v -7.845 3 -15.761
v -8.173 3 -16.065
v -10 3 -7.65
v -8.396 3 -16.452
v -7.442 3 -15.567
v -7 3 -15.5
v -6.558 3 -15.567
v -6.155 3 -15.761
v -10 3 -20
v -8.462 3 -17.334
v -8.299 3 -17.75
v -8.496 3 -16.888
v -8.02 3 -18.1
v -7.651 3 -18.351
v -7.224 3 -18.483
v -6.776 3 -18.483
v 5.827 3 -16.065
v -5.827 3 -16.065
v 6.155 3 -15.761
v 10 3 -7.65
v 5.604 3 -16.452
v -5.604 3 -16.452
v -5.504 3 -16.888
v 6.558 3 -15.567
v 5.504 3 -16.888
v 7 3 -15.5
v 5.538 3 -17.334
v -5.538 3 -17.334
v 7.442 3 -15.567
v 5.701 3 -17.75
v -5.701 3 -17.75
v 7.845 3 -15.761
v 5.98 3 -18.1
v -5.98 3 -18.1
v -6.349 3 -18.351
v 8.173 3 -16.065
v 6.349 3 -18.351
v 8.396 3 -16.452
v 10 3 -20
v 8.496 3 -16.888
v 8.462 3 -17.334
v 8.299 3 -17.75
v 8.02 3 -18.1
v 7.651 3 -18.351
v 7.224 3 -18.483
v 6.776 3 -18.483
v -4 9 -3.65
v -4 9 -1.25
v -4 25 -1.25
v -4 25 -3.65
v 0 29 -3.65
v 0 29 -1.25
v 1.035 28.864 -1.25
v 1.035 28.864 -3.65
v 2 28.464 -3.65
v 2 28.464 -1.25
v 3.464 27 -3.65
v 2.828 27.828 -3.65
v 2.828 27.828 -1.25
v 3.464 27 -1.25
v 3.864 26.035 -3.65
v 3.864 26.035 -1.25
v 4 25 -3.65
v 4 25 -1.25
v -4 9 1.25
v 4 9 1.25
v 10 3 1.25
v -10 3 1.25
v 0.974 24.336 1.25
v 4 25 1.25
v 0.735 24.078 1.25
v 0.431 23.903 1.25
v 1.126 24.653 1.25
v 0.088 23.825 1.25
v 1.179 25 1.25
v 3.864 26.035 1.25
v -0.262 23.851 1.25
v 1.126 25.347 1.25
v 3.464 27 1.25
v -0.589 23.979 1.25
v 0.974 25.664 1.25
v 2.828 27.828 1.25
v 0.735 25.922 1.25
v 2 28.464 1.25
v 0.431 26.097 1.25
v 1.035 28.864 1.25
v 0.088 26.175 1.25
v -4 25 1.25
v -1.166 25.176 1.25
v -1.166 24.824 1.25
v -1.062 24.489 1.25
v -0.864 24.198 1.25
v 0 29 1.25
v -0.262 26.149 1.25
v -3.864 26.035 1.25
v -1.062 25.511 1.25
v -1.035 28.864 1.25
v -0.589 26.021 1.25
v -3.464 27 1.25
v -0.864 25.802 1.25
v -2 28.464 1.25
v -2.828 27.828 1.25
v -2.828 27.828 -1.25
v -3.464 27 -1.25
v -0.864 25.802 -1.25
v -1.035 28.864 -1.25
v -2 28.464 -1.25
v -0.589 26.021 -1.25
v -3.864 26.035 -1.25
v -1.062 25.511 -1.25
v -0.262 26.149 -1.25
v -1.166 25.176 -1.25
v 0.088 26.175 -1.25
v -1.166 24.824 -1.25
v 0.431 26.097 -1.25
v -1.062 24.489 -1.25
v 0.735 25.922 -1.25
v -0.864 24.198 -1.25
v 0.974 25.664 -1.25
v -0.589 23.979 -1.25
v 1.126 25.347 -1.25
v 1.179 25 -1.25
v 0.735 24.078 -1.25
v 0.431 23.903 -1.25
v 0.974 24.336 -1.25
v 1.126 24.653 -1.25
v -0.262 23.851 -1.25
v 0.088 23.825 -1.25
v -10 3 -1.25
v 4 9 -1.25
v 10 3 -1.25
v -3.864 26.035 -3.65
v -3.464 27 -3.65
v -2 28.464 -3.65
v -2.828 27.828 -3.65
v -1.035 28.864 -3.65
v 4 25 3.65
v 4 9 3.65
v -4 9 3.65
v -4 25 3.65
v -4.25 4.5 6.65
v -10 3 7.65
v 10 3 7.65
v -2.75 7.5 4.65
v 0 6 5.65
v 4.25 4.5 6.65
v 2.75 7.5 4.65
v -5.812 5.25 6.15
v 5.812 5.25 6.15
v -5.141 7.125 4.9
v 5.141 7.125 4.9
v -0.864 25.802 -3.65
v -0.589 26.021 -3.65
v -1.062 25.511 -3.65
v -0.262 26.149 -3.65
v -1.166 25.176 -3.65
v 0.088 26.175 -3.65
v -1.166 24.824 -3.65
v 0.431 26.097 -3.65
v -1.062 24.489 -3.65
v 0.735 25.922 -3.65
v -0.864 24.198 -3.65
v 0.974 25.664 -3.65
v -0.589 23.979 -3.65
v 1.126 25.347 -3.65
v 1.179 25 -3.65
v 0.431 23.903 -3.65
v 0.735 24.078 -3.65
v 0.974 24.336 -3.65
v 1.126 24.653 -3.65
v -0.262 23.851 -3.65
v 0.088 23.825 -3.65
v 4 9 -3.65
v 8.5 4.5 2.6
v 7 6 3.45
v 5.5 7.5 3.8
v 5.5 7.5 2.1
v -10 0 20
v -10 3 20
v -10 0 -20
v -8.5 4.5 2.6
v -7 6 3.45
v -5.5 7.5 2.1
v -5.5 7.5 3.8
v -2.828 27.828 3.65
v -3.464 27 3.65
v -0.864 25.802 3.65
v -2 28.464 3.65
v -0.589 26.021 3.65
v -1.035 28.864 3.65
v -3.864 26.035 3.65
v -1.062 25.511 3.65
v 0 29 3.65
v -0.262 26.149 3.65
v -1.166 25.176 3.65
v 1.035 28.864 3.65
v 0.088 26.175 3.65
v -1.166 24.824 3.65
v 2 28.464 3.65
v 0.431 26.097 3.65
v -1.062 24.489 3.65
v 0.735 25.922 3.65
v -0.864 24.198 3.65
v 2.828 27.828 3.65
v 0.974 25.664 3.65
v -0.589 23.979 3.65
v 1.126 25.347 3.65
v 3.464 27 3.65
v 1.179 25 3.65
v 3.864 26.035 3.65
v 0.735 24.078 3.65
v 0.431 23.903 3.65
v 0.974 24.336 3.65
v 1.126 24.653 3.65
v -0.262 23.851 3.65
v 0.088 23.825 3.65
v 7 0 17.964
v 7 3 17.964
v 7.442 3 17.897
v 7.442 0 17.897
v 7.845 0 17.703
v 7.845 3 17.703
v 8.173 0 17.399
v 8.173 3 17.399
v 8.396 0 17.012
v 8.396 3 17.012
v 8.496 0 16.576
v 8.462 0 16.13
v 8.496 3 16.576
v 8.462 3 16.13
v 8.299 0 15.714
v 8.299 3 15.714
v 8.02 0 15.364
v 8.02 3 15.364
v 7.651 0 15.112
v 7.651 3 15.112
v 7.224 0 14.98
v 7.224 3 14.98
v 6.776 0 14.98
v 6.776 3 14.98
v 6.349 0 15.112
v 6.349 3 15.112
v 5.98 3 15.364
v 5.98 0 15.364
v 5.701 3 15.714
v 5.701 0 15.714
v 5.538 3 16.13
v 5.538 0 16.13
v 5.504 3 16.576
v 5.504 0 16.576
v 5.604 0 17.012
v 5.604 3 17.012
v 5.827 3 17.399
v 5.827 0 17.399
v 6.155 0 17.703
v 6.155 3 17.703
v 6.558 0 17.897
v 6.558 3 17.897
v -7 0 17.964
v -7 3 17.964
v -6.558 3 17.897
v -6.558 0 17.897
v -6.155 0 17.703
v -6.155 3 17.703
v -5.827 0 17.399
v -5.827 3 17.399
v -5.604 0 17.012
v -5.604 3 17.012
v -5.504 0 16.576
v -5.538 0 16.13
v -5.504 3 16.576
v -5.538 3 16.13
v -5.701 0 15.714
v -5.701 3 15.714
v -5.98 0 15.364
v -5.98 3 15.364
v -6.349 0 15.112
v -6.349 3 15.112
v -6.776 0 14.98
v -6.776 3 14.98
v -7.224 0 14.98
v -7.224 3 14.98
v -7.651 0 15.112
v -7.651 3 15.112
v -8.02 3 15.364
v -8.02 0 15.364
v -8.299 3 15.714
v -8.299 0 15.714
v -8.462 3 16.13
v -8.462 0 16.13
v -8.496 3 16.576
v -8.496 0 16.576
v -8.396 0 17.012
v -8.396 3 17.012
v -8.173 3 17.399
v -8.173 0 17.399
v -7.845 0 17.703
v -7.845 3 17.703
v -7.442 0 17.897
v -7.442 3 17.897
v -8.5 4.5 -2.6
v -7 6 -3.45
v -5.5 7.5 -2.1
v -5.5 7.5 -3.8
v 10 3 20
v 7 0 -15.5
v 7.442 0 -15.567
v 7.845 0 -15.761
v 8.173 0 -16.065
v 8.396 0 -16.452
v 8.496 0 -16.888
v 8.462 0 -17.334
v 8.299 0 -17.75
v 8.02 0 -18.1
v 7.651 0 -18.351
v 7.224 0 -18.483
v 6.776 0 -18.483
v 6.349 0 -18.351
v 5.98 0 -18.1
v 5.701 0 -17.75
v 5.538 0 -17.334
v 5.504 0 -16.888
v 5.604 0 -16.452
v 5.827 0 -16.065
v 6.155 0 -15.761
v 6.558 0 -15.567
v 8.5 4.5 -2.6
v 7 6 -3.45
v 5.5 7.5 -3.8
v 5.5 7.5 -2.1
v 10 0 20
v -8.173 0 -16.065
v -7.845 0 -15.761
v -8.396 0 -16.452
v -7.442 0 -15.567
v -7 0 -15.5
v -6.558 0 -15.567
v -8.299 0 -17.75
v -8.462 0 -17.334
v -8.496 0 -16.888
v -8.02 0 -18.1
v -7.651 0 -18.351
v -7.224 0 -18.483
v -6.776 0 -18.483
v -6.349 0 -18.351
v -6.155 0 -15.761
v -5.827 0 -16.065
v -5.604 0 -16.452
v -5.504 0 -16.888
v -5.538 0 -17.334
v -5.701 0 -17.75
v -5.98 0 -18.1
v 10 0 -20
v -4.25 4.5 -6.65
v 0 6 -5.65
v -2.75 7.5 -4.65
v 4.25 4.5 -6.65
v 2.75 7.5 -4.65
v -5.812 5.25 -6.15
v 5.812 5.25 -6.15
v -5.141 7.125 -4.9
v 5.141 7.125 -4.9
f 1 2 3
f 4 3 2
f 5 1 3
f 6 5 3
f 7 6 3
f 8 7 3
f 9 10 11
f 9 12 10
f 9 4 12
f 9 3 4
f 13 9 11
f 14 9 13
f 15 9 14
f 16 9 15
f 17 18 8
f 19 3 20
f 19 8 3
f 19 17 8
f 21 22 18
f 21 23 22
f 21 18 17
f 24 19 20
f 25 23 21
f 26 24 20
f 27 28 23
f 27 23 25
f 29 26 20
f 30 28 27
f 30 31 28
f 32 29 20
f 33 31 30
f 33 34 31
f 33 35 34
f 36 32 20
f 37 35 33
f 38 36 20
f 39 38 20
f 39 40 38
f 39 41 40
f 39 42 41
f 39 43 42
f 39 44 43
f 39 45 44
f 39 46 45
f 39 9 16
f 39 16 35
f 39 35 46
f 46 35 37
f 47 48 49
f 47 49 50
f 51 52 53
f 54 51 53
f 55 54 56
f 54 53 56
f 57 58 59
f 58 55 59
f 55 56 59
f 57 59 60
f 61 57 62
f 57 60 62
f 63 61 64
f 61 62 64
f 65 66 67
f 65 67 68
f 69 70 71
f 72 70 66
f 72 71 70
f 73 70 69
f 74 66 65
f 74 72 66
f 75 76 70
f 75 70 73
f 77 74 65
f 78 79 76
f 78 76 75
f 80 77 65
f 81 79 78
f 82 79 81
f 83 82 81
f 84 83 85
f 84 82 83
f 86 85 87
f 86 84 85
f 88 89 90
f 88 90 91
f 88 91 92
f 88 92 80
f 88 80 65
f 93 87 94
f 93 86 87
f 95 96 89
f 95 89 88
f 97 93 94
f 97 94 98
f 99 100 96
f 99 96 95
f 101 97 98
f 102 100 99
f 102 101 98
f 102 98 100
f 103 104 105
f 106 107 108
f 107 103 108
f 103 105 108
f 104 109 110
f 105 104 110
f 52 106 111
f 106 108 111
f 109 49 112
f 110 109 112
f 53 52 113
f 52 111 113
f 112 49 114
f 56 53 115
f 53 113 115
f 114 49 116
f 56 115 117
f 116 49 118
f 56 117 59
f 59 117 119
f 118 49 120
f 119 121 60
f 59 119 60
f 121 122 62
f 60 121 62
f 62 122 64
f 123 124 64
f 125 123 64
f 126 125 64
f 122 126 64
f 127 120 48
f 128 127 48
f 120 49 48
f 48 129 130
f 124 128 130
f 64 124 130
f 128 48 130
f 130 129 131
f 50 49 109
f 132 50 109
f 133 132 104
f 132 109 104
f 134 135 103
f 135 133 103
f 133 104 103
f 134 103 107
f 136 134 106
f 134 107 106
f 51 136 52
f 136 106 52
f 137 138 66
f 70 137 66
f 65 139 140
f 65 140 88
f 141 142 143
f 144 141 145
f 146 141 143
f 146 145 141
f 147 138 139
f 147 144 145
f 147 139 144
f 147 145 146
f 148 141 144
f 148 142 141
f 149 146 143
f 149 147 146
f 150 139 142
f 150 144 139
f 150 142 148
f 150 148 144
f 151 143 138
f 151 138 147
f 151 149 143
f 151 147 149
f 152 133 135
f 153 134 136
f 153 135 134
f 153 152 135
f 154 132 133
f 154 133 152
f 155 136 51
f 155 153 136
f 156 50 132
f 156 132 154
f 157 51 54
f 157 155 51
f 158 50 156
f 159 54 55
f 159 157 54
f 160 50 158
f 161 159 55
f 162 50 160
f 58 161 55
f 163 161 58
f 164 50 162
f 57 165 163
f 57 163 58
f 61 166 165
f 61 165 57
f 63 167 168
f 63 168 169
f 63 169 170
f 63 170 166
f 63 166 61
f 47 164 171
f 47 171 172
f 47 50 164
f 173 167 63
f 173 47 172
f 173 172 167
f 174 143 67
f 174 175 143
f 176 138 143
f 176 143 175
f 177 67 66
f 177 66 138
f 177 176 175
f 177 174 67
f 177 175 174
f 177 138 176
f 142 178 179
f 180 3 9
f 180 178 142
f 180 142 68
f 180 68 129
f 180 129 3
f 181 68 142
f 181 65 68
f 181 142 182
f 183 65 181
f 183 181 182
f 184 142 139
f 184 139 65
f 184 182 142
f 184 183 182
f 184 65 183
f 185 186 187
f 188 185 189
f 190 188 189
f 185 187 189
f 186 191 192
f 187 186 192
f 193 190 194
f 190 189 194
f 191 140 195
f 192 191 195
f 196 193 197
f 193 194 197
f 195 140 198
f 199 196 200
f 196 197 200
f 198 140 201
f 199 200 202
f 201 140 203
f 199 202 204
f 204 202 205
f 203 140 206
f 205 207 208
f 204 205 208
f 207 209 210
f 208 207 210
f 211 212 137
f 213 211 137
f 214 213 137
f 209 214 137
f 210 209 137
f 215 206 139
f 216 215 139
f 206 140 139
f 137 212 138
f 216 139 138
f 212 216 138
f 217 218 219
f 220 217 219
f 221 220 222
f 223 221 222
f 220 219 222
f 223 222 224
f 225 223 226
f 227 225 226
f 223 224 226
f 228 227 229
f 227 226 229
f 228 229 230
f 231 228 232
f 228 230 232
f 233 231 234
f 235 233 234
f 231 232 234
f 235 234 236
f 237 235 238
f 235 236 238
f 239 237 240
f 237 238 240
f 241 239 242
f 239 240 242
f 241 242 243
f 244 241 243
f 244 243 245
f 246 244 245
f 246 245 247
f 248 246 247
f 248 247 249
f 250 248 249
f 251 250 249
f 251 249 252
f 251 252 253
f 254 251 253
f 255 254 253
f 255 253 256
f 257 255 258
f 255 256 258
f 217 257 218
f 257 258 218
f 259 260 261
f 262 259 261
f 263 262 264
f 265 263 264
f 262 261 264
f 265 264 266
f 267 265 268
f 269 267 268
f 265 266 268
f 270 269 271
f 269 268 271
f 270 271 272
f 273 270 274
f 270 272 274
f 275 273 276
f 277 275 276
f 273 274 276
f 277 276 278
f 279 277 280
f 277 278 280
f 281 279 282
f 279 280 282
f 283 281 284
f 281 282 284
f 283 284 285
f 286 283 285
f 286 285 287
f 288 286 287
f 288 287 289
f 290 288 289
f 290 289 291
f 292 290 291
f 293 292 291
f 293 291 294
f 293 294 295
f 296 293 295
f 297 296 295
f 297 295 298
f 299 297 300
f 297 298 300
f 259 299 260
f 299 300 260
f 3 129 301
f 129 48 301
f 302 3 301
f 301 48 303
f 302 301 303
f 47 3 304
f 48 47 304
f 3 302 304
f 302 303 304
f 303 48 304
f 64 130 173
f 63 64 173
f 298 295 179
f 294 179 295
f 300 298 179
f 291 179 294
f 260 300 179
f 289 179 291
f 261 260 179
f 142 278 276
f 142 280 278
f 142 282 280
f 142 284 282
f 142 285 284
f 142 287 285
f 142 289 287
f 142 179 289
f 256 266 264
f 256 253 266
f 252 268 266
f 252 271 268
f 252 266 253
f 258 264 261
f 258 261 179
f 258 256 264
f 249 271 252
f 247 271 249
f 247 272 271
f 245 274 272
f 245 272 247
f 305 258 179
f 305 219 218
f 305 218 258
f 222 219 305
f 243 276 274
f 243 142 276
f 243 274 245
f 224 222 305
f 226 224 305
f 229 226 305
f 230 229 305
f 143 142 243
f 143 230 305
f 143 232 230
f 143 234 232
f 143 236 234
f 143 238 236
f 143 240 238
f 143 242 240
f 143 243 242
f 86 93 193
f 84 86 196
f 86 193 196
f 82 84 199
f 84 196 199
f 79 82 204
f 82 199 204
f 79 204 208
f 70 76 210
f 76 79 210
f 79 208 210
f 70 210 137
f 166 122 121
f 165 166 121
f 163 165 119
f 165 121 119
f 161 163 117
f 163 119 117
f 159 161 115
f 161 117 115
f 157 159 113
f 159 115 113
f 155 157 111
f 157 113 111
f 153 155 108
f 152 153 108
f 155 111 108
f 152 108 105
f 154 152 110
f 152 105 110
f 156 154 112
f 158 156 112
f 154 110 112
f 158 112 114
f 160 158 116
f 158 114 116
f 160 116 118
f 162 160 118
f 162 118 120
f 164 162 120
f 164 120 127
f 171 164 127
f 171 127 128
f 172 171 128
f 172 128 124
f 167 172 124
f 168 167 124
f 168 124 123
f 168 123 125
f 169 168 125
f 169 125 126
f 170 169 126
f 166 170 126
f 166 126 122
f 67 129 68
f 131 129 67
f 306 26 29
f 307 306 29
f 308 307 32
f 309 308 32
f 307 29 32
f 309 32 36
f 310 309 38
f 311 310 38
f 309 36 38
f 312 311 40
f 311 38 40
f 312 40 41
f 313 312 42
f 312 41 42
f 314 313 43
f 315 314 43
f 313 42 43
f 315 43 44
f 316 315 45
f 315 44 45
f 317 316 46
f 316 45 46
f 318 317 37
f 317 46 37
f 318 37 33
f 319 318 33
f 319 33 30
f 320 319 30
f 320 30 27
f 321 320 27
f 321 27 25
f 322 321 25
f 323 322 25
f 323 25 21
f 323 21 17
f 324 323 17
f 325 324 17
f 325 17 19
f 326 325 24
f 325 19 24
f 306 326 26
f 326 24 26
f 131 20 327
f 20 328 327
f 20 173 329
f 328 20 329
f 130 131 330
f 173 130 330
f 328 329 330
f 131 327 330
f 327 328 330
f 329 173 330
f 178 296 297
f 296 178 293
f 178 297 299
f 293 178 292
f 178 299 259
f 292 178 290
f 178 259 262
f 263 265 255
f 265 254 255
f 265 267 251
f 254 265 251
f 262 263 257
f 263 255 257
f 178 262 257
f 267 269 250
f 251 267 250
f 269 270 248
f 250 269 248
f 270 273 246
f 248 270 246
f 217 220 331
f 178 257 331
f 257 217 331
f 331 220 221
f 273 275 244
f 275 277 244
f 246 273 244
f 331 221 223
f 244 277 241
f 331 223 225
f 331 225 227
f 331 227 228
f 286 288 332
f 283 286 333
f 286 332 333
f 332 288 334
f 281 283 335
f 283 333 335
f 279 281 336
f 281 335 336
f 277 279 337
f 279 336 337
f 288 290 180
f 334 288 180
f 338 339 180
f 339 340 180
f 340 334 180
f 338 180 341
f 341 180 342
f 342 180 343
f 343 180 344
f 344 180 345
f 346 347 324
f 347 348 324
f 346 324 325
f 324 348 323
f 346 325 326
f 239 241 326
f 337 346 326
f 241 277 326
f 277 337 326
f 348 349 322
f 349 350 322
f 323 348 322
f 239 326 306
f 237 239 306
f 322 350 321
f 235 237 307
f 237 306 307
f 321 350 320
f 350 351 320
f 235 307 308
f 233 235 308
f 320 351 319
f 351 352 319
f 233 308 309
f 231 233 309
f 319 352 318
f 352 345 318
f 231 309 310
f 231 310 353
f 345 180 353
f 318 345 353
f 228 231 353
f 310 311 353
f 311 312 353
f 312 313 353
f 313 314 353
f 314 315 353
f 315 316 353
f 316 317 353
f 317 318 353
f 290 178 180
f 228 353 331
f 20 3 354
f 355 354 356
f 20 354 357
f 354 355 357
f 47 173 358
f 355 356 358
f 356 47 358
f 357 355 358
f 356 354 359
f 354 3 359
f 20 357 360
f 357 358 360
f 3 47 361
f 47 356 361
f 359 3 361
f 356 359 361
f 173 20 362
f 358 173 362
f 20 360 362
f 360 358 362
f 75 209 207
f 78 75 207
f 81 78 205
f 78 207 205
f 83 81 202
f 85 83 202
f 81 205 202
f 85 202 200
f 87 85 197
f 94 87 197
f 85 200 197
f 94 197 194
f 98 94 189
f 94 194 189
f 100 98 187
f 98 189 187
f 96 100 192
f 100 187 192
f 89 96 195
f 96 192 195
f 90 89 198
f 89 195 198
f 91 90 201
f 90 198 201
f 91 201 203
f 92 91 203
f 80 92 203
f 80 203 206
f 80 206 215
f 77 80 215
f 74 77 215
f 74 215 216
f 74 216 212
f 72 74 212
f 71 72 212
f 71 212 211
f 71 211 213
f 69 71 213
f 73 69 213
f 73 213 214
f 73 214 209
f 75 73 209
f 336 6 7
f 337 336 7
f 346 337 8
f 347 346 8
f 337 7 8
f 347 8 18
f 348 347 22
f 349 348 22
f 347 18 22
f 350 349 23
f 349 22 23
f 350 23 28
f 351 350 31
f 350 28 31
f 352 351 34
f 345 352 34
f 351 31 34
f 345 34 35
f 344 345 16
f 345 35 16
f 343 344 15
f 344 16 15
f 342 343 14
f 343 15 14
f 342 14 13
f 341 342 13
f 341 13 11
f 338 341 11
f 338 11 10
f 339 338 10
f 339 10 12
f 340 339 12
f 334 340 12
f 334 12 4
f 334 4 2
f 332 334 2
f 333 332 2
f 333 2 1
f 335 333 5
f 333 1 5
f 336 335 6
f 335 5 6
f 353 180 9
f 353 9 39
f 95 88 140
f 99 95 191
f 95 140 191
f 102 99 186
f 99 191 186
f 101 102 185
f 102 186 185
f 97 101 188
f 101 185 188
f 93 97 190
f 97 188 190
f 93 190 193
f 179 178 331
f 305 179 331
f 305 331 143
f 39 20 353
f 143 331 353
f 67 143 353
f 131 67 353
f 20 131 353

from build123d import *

# Parameters (mm, degrees)
SKETCH1_W           = 20
SKETCH1_H           = 40
BOSS_EXTRUDE1_DEPTH = 3
SKETCH4_W           = 8
SKETCH4_H           = 2.4
BOSS_EXTRUDE2_DEPTH = 20
CUT_EXTRUDE1_REACH  = 40.734
SKETCH5_R           = 1.178679728
SKETCH6_R           = 1.5
CUT_EXTRUDE2_DEPTH  = 3


with BuildPart() as part:
    # Sketch1 → Boss-Extrude1 (new body)
    with BuildSketch(Plane(origin=(0, 0, 0), x_dir=(1, 0, 0), z_dir=(0, 1, 0))):
        Rectangle(SKETCH1_W, SKETCH1_H)
    extrude(amount=BOSS_EXTRUDE1_DEPTH)

    # Sketch2 → Loft3 section 0
    with BuildSketch(Plane(origin=(0, 3, 0), x_dir=(1, 0, 0), z_dir=(0, 1, 0))):
        with BuildLine():
            Line((-10, 7.65), (10, 7.65))
            Line((10, 7.65), (10, 1.25))
            Line((10, 1.25), (-10, 1.25))
            Line((-10, 1.25), (-10, 7.65))
        make_face()
    # Sketch3 → Loft3 section 1
    with BuildSketch(Plane(origin=(0, 9, 0), x_dir=(1, 0, 0), z_dir=(0, 1, 0))):
        with BuildLine():
            Line((-4, 3.65), (4, 3.65))
            Line((4, 3.65), (4, 1.25))
            Line((4, 1.25), (-4, 1.25))
            Line((-4, 1.25), (-4, 3.65))
        make_face()
    loft3 = loft()

    # Mirror1: Loft3 across plane
    add(loft3.mirror(Plane(origin=(0, 0, 0), x_dir=(1, 0, 0), z_dir=(0, 0, -1))))

    # Sketch4 → Boss-Extrude2 (add)
    with BuildSketch(Plane(origin=(0, 9, 0), x_dir=(1, 0, 0), z_dir=(0, 1, 0))):
        with Locations((0, 2.45)):
            Rectangle(SKETCH4_W, SKETCH4_H)
        with Locations((0, -2.45)):
            Rectangle(SKETCH4_W, SKETCH4_H)
    extrude(amount=BOSS_EXTRUDE2_DEPTH)

    # Cut-Extrude1: up to this face of the body (flat: up to its plane)
    cut_extrude1_end = Plane(part.part.faces().sort_by_distance((0, 19, -3.65))[0])
    # Sketch5 → Cut-Extrude1 (cut, up to the picked face)
    with BuildSketch(Plane.XY.offset(3.65), mode=Mode.PRIVATE) as cut_extrude1_sk1:
        with BuildLine():
            Line((-4, 29), (-4, 25))
            ThreePointArc((-4, 25), (-2.828427125, 27.828427125), (0, 29))
            Line((0, 29), (-4, 29))
        make_face()
    cut_extrude1_tool1 = split(extrude(cut_extrude1_sk1.sketch, amount=-CUT_EXTRUDE1_REACH, mode=Mode.PRIVATE), bisect_by=cut_extrude1_end, keep=Keep.BOTH, mode=Mode.PRIVATE)
    # Sketch5 → Cut-Extrude1 (cut, up to the picked face)
    with BuildSketch(Plane.XY.offset(3.65), mode=Mode.PRIVATE) as cut_extrude1_sk2:
        with BuildLine():
            Line((4, 29), (0, 29))
            ThreePointArc((0, 29), (2.828427125, 27.828427125), (4, 25))
            Line((4, 25), (4, 29))
        make_face()
    cut_extrude1_tool2 = split(extrude(cut_extrude1_sk2.sketch, amount=-CUT_EXTRUDE1_REACH, mode=Mode.PRIVATE), bisect_by=cut_extrude1_end, keep=Keep.BOTH, mode=Mode.PRIVATE)
    # Sketch5 → Cut-Extrude1 (cut, up to the picked face)
    with BuildSketch(Plane.XY.offset(3.65), mode=Mode.PRIVATE) as cut_extrude1_sk3:
        with Locations((0, 25)):
            Circle(SKETCH5_R)
    cut_extrude1_tool3 = split(extrude(cut_extrude1_sk3.sketch, amount=-CUT_EXTRUDE1_REACH, mode=Mode.PRIVATE), bisect_by=cut_extrude1_end, keep=Keep.BOTH, mode=Mode.PRIVATE)
    add(cut_extrude1_tool1.solids().sort_by(Axis((-3.106528, 28.106528, 3.65), (0, 0, -1)))[0], mode=Mode.SUBTRACT)
    add(cut_extrude1_tool2.solids().sort_by(Axis((3.106528, 28.106528, 3.65), (0, 0, -1)))[0], mode=Mode.SUBTRACT)
    add(cut_extrude1_tool3.solids().sort_by(Axis((0, 25, 3.65), (0, 0, -1)))[0], mode=Mode.SUBTRACT)

    # Sketch6 → Cut-Extrude2 (cut)
    with BuildSketch(Plane(origin=(0, 3, 0), x_dir=(1, 0, 0), z_dir=(0, 1, 0))):
        with Locations(Location((7, 17, 0), (0, 0, 270))):
            Circle(SKETCH6_R)
        with Locations(Location((-7, 17, 0), (0, 0, 270))):
            Circle(SKETCH6_R)
        with Locations(Location((7, -16.463590195, 0), (0, 0, 270))):
            Circle(SKETCH6_R)
        with Locations(Location((-7, -16.463590195, 0), (0, 0, 270))):
            Circle(SKETCH6_R)
    extrude(amount=-CUT_EXTRUDE2_DEPTH, mode=Mode.SUBTRACT)


solid = part.part
